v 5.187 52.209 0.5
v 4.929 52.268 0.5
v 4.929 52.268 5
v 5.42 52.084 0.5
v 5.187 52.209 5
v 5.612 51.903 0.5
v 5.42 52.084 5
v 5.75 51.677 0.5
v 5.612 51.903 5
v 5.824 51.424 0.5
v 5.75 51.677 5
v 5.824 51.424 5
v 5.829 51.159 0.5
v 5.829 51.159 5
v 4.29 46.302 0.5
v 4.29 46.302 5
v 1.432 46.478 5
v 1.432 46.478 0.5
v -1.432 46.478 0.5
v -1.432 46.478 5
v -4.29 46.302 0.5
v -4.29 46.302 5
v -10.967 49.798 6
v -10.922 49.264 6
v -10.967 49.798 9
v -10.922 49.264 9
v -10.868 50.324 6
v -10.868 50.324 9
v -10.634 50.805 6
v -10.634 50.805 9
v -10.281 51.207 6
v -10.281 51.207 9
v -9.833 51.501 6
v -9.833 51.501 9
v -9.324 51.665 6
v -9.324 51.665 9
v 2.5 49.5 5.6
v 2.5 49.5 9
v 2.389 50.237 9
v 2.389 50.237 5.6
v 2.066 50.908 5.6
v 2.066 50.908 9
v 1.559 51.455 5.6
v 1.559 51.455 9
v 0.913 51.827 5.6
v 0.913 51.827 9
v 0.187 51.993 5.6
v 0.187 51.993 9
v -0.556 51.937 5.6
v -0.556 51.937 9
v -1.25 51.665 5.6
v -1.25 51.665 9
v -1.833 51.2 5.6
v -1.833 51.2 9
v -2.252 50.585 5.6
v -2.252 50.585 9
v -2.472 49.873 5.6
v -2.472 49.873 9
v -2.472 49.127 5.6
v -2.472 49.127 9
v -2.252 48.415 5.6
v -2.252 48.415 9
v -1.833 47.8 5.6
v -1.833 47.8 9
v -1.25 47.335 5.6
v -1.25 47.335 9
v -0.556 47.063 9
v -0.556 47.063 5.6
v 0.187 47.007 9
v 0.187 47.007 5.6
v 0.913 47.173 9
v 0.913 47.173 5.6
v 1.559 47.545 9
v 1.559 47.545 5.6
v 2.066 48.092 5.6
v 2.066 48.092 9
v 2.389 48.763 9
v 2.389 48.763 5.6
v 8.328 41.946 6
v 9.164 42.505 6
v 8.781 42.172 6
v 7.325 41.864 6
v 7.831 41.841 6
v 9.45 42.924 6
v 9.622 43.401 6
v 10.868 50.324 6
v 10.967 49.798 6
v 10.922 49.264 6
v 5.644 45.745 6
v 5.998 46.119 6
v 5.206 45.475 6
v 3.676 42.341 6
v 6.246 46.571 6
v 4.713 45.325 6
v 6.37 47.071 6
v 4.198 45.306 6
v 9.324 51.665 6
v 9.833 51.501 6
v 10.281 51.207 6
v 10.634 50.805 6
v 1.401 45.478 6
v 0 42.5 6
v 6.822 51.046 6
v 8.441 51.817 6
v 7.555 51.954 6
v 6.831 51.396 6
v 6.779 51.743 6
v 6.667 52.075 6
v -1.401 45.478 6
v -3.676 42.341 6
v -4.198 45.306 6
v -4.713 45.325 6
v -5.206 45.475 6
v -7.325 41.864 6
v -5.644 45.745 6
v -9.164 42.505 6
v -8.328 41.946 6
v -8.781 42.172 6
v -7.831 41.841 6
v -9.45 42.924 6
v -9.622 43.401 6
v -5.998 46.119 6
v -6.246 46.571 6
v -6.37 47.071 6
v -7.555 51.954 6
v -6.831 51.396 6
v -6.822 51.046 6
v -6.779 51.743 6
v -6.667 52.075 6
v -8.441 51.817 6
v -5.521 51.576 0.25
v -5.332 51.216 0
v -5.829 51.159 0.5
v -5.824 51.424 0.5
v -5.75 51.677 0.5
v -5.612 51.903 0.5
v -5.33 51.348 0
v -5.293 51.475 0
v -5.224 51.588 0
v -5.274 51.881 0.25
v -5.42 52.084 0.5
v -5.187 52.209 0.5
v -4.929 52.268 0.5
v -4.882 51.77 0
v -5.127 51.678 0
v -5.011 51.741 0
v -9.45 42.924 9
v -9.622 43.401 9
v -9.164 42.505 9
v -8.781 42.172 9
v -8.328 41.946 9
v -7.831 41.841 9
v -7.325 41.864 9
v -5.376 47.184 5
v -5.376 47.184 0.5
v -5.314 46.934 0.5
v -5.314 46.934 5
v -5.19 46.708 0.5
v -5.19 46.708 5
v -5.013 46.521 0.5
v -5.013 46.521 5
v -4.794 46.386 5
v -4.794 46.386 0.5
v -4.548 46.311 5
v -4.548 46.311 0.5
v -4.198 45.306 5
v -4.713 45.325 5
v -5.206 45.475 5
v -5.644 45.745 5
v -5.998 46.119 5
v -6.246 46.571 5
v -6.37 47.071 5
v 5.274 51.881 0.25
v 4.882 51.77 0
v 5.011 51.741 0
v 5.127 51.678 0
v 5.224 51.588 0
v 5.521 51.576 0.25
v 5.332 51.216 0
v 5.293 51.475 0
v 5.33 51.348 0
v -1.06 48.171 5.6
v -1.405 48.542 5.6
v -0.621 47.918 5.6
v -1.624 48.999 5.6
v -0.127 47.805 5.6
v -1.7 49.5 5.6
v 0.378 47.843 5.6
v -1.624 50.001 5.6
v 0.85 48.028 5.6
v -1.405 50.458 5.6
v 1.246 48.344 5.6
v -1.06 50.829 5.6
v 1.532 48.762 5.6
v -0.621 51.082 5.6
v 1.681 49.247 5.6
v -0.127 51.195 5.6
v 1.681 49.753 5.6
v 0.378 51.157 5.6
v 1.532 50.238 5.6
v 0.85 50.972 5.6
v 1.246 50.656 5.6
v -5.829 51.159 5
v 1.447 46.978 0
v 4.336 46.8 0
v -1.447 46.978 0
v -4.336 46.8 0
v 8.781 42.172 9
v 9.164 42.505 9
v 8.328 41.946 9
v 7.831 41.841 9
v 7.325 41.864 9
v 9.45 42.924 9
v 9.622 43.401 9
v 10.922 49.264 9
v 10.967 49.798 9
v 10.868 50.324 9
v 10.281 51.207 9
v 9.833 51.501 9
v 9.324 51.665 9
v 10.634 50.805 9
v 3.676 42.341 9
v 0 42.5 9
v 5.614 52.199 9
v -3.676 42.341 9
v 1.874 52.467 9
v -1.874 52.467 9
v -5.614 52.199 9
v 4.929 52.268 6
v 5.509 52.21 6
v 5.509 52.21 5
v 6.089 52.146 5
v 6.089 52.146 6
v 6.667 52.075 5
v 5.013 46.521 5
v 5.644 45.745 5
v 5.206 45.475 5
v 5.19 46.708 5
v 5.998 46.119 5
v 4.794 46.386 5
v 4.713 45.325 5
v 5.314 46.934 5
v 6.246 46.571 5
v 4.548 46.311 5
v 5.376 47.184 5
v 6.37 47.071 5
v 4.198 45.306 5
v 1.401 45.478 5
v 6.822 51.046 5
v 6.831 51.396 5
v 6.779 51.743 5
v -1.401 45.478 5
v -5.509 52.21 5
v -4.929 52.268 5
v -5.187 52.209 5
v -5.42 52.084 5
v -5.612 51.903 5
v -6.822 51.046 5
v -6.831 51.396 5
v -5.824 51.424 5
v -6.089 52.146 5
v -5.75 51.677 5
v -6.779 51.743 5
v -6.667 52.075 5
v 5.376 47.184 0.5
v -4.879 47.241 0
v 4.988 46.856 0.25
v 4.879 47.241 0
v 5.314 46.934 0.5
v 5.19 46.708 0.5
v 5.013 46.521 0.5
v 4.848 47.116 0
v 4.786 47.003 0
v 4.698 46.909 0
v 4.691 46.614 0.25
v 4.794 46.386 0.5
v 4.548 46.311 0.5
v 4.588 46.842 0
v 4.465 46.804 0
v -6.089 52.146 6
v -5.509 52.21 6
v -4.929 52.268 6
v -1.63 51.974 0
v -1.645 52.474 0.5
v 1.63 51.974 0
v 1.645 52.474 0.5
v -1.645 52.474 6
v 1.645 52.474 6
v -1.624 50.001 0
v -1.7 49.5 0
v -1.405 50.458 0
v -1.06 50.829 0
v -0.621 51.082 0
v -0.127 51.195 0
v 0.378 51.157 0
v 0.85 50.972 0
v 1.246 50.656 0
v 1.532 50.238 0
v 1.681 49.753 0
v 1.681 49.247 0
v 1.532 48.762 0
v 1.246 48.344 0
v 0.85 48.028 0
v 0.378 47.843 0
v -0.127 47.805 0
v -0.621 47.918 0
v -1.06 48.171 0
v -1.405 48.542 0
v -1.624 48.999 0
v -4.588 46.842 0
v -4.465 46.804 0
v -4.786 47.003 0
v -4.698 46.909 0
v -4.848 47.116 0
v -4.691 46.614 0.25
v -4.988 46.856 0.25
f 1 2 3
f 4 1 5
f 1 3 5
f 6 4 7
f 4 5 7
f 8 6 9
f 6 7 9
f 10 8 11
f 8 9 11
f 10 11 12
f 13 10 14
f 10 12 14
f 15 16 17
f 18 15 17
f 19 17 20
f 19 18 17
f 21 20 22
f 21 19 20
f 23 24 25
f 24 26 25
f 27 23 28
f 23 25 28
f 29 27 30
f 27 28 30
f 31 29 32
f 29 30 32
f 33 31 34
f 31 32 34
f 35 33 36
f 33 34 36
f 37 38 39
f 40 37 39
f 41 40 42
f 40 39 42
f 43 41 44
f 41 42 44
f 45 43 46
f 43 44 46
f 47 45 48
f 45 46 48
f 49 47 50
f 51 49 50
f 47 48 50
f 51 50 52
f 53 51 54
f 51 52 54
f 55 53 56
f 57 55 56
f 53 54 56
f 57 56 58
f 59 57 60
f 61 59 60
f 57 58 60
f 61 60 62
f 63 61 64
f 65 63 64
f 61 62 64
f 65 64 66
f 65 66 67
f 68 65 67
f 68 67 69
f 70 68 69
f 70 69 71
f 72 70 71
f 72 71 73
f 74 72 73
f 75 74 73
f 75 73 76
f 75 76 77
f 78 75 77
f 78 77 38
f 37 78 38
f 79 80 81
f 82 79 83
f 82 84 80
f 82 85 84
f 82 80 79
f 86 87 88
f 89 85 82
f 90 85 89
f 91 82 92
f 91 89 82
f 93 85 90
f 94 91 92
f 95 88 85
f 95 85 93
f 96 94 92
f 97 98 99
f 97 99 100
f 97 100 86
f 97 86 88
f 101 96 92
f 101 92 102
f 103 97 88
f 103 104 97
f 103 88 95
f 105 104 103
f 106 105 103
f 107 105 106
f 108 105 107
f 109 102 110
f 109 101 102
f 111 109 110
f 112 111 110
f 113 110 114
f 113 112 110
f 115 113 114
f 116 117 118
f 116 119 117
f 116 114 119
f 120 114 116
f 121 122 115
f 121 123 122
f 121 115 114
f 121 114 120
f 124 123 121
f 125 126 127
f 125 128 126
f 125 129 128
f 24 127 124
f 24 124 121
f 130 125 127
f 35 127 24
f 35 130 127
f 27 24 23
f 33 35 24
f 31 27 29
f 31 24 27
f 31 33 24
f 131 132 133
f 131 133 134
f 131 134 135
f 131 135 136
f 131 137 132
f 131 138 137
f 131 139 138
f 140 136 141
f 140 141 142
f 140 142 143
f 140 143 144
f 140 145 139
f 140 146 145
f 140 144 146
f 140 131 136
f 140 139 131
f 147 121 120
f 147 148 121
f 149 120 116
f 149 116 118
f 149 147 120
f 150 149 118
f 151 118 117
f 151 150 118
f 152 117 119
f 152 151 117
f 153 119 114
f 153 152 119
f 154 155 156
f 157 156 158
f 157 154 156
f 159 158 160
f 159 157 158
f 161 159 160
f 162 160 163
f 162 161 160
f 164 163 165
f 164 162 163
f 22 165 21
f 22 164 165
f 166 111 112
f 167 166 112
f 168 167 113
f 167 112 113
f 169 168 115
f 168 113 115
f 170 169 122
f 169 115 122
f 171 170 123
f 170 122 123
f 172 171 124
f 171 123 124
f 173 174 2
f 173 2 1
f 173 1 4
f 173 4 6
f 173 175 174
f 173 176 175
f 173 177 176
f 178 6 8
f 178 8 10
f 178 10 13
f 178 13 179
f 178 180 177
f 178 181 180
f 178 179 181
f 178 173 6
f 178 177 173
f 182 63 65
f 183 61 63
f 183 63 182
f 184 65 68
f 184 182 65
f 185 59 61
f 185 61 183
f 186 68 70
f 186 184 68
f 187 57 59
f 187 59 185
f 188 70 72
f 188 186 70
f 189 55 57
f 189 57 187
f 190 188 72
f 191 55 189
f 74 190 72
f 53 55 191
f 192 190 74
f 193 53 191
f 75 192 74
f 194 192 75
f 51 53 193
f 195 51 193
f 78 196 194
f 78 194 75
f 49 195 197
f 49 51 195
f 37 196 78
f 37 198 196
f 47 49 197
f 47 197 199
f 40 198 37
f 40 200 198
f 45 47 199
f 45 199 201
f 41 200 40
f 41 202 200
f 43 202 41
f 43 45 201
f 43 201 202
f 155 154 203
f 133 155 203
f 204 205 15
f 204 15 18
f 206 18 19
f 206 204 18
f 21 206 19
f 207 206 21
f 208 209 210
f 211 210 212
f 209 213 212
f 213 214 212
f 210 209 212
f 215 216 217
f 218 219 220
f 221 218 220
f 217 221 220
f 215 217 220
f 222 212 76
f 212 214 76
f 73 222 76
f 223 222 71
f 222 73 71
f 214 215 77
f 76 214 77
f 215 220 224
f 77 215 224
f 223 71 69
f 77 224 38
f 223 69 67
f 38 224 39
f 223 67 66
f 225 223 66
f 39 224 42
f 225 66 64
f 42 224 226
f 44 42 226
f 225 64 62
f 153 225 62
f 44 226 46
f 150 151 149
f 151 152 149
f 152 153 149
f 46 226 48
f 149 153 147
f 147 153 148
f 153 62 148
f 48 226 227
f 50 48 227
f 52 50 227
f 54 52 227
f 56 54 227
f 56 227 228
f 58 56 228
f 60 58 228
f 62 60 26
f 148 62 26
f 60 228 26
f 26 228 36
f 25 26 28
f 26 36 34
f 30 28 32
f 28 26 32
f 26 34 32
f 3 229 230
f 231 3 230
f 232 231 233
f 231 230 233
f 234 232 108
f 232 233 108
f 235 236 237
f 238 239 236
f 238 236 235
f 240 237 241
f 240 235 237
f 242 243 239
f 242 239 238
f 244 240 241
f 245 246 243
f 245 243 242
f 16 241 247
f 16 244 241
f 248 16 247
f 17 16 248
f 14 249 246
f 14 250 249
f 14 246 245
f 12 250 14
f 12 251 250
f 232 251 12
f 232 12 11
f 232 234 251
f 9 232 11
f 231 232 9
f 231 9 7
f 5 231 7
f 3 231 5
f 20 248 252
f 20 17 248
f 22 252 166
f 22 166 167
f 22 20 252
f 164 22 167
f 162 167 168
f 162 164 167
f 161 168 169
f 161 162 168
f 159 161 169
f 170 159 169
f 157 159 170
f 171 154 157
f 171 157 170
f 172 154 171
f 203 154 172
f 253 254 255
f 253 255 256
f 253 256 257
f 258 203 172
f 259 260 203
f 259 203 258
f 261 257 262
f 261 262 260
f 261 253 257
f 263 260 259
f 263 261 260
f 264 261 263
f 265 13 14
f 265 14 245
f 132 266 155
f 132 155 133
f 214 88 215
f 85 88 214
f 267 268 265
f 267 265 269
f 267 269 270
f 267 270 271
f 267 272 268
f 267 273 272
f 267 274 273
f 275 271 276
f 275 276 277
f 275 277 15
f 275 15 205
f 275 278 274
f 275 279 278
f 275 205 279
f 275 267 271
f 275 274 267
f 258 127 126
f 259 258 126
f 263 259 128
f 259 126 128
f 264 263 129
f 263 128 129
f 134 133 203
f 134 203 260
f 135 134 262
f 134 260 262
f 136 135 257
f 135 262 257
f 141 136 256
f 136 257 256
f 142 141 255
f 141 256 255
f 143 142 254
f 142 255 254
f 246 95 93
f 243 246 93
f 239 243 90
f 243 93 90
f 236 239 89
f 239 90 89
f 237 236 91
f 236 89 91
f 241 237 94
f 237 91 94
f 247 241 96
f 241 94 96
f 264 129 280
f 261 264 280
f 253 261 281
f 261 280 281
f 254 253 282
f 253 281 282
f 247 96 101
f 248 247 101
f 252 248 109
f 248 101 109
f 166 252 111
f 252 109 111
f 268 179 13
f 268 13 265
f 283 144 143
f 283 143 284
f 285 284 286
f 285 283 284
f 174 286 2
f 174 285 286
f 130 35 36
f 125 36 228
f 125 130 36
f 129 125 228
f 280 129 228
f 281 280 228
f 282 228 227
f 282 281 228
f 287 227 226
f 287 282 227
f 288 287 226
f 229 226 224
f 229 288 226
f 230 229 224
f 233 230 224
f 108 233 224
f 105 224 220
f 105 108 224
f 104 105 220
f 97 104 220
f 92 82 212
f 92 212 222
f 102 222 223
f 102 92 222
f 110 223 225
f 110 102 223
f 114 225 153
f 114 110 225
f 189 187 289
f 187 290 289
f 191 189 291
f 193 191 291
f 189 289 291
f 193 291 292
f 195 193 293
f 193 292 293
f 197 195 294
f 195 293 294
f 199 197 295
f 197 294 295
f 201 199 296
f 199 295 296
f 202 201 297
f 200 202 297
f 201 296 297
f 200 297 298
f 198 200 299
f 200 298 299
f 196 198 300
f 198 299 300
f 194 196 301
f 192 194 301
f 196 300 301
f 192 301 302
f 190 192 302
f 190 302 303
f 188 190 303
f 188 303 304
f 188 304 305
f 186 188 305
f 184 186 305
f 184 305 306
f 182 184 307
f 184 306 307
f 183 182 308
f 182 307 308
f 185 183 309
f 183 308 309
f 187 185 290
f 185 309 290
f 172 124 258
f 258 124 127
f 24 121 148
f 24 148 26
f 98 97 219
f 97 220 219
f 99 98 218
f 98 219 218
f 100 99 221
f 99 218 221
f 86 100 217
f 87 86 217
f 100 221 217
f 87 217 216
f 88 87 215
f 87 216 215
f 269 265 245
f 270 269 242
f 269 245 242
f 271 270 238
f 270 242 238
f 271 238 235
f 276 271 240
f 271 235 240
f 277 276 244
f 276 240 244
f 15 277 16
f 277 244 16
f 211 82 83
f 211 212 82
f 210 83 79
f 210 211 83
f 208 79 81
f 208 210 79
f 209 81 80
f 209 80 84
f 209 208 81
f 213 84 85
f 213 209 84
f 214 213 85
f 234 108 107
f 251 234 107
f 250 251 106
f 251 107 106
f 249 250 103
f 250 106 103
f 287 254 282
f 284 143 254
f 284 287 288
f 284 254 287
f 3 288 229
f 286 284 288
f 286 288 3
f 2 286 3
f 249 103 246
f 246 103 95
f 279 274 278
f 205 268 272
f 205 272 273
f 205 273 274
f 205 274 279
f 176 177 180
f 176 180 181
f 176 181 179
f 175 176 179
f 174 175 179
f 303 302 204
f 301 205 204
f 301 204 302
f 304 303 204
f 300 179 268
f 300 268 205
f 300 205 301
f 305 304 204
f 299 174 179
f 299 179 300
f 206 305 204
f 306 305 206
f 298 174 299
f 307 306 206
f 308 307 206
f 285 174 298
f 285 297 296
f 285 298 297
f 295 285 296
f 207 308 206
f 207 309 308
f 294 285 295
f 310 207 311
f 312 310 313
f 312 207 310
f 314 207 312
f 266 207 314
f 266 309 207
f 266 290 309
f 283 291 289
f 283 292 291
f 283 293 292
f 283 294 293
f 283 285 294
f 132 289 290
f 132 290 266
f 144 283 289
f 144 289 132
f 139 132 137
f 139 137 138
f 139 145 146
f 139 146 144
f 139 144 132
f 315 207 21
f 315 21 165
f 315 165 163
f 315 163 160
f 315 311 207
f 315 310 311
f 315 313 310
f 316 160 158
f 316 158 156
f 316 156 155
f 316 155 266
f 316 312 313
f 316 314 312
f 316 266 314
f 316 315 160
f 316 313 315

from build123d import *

# Parameters (mm, degrees)
EXTRUDE_1_DEPTH           = 6
FILLET_1_R                = 1
EXTRUDE_2_DEPTH           = 3
FILLET_2_R                = 2
HOLE_WIZARD_1_D           = 3.4
HOLE_WIZARD_1_CBORE_D     = 5
HOLE_WIZARD_1_CBORE_DEPTH = 3.4
EXTRUDE_3_DEPTH           = 1
CHAMFER_1_SIZE            = 0.5


with BuildPart() as part:
    # 草图1 → 凸台-拉伸1 (new body)
    with BuildSketch(Plane.XY):
        with BuildLine():
            Line((-5.26394944, 46.201091289), (-5.943168723, 52.162522423))
            ThreePointArc((-5.943168723, 52.162522423), (0, 52.5), (5.943168723, 52.162522423))
            Line((5.943168723, 52.162522423), (5.26394944, 46.201091289))
            ThreePointArc((5.26394944, 46.201091289), (0, 46.5), (-5.26394944, 46.201091289))
        make_face()
    extrude(amount=EXTRUDE_1_DEPTH)

    # 圆角1
    fillet_1_edges = [part.edges().sort_by_distance(p)[0] for p in [
        (5.943168723, 52.162522423, 3),
        (5.26394944, 46.201091289, 3),
        (-5.26394944, 46.201091289, 3),
        (-5.943168723, 52.162522423, 3),
    ]]
    fillet(fillet_1_edges, radius=FILLET_1_R)

    # 草图2 → 凸台-拉伸2 (add)
    with BuildSketch(Plane.XY.offset(6)):
        with BuildLine():
            Line((-9.198683592, 41.492580303), (-11.363079732, 51.255540374))
            ThreePointArc((-11.363079732, 51.255540374), (0, 52.5), (11.363079732, 51.255540374))
            Line((11.363079732, 51.255540374), (9.198683592, 41.492580303))
            ThreePointArc((9.198683592, 41.492580303), (0, 42.5), (-9.198683592, 41.492580303))
        make_face()
    extrude(amount=EXTRUDE_2_DEPTH)

    # 圆角2
    fillet_2_edges = [part.edges().sort_by_distance(p)[0] for p in [
        (11.363079732, 51.255540374, 7.5),
        (-11.363079732, 51.255540374, 7.5),
        (-9.198683592, 41.492580303, 7.5),
        (9.198683592, 41.492580303, 7.5),
    ]]
    fillet(fillet_2_edges, radius=FILLET_2_R)

    # 打孔尺寸(%根据)内六角圆柱头螺钉的类型1 (through all)
    with Locations(Plane.XY.offset(9)):
        with Locations((0, 49.5)):
            CounterBoreHole(HOLE_WIZARD_1_D / 2, HOLE_WIZARD_1_CBORE_D / 2, HOLE_WIZARD_1_CBORE_DEPTH)

    # 草图6 → 凸台-拉伸3 (add)
    with BuildSketch(Plane(origin=(0, 0, 6), x_dir=(-1, 0, 0), z_dir=(0, 0, -1))):
        with BuildLine():
            Line((-6.822438201, 51.046100115), (-6.369532765, 47.071000121))
            ThreePointArc((-6.369532765, 47.071000121), (-5.643826215, 45.74538326), (-4.197867409, 45.305936799))
            ThreePointArc((-4.197867409, 45.305936799), (0, 45.5), (4.197867409, 45.305936799))
            ThreePointArc((4.197867409, 45.305936799), (5.643826215, 45.74538326), (6.369532765, 47.071000121))
            Line((6.369532765, 47.071000121), (6.822438201, 51.046100115))
            ThreePointArc((6.822438201, 51.046100115), (6.812927902, 51.570778372), (6.667268559, 52.074922275))
            ThreePointArc((6.667268559, 52.074922275), (5.799030491, 52.178743233), (4.929183703, 52.268089194))
            ThreePointArc((4.929183703, 52.268089194), (5.611821641, 51.902590333), (5.828866345, 51.159303329))
            Line((5.828866345, 51.159303329), (5.375960909, 47.184203334))
            ThreePointArc((5.375960909, 47.184203334), (5.013107634, 46.521394904), (4.290128231, 46.301671673))
            ThreePointArc((4.290128231, 46.301671673), (0, 46.5), (-4.290128231, 46.301671673))
            ThreePointArc((-4.290128231, 46.301671673), (-5.013107634, 46.521394904), (-5.375960909, 47.184203334))
            Line((-5.375960909, 47.184203334), (-5.828866345, 51.159303329))
            ThreePointArc((-5.828866345, 51.159303329), (-5.611821641, 51.902590333), (-4.929183703, 52.268089194))
            ThreePointArc((-4.929183703, 52.268089194), (-5.799030491, 52.178743233), (-6.667268559, 52.074922275))
            ThreePointArc((-6.667268559, 52.074922275), (-6.812927902, 51.570778372), (-6.822438201, 51.046100115))
        make_face()
    extrude(amount=EXTRUDE_3_DEPTH)

    # 倒角1
    chamfer_1_edges = [part.edges().sort_by_distance(p)[0] for p in [
        (0, 46.5, 0),
        (0, 52.5, 0),
        (5.602413627, 49.171753332, 0),
        (-5.602413627, 49.171753332, 0),
        (-5.611821641, 51.902590333, 0),
        (5.611821641, 51.902590333, 0),
        (5.013107634, 46.521394904, 0),
        (-5.013107634, 46.521394904, 0),
    ]]
    chamfer(chamfer_1_edges, length=CHAMFER_1_SIZE)


solid = part.part
